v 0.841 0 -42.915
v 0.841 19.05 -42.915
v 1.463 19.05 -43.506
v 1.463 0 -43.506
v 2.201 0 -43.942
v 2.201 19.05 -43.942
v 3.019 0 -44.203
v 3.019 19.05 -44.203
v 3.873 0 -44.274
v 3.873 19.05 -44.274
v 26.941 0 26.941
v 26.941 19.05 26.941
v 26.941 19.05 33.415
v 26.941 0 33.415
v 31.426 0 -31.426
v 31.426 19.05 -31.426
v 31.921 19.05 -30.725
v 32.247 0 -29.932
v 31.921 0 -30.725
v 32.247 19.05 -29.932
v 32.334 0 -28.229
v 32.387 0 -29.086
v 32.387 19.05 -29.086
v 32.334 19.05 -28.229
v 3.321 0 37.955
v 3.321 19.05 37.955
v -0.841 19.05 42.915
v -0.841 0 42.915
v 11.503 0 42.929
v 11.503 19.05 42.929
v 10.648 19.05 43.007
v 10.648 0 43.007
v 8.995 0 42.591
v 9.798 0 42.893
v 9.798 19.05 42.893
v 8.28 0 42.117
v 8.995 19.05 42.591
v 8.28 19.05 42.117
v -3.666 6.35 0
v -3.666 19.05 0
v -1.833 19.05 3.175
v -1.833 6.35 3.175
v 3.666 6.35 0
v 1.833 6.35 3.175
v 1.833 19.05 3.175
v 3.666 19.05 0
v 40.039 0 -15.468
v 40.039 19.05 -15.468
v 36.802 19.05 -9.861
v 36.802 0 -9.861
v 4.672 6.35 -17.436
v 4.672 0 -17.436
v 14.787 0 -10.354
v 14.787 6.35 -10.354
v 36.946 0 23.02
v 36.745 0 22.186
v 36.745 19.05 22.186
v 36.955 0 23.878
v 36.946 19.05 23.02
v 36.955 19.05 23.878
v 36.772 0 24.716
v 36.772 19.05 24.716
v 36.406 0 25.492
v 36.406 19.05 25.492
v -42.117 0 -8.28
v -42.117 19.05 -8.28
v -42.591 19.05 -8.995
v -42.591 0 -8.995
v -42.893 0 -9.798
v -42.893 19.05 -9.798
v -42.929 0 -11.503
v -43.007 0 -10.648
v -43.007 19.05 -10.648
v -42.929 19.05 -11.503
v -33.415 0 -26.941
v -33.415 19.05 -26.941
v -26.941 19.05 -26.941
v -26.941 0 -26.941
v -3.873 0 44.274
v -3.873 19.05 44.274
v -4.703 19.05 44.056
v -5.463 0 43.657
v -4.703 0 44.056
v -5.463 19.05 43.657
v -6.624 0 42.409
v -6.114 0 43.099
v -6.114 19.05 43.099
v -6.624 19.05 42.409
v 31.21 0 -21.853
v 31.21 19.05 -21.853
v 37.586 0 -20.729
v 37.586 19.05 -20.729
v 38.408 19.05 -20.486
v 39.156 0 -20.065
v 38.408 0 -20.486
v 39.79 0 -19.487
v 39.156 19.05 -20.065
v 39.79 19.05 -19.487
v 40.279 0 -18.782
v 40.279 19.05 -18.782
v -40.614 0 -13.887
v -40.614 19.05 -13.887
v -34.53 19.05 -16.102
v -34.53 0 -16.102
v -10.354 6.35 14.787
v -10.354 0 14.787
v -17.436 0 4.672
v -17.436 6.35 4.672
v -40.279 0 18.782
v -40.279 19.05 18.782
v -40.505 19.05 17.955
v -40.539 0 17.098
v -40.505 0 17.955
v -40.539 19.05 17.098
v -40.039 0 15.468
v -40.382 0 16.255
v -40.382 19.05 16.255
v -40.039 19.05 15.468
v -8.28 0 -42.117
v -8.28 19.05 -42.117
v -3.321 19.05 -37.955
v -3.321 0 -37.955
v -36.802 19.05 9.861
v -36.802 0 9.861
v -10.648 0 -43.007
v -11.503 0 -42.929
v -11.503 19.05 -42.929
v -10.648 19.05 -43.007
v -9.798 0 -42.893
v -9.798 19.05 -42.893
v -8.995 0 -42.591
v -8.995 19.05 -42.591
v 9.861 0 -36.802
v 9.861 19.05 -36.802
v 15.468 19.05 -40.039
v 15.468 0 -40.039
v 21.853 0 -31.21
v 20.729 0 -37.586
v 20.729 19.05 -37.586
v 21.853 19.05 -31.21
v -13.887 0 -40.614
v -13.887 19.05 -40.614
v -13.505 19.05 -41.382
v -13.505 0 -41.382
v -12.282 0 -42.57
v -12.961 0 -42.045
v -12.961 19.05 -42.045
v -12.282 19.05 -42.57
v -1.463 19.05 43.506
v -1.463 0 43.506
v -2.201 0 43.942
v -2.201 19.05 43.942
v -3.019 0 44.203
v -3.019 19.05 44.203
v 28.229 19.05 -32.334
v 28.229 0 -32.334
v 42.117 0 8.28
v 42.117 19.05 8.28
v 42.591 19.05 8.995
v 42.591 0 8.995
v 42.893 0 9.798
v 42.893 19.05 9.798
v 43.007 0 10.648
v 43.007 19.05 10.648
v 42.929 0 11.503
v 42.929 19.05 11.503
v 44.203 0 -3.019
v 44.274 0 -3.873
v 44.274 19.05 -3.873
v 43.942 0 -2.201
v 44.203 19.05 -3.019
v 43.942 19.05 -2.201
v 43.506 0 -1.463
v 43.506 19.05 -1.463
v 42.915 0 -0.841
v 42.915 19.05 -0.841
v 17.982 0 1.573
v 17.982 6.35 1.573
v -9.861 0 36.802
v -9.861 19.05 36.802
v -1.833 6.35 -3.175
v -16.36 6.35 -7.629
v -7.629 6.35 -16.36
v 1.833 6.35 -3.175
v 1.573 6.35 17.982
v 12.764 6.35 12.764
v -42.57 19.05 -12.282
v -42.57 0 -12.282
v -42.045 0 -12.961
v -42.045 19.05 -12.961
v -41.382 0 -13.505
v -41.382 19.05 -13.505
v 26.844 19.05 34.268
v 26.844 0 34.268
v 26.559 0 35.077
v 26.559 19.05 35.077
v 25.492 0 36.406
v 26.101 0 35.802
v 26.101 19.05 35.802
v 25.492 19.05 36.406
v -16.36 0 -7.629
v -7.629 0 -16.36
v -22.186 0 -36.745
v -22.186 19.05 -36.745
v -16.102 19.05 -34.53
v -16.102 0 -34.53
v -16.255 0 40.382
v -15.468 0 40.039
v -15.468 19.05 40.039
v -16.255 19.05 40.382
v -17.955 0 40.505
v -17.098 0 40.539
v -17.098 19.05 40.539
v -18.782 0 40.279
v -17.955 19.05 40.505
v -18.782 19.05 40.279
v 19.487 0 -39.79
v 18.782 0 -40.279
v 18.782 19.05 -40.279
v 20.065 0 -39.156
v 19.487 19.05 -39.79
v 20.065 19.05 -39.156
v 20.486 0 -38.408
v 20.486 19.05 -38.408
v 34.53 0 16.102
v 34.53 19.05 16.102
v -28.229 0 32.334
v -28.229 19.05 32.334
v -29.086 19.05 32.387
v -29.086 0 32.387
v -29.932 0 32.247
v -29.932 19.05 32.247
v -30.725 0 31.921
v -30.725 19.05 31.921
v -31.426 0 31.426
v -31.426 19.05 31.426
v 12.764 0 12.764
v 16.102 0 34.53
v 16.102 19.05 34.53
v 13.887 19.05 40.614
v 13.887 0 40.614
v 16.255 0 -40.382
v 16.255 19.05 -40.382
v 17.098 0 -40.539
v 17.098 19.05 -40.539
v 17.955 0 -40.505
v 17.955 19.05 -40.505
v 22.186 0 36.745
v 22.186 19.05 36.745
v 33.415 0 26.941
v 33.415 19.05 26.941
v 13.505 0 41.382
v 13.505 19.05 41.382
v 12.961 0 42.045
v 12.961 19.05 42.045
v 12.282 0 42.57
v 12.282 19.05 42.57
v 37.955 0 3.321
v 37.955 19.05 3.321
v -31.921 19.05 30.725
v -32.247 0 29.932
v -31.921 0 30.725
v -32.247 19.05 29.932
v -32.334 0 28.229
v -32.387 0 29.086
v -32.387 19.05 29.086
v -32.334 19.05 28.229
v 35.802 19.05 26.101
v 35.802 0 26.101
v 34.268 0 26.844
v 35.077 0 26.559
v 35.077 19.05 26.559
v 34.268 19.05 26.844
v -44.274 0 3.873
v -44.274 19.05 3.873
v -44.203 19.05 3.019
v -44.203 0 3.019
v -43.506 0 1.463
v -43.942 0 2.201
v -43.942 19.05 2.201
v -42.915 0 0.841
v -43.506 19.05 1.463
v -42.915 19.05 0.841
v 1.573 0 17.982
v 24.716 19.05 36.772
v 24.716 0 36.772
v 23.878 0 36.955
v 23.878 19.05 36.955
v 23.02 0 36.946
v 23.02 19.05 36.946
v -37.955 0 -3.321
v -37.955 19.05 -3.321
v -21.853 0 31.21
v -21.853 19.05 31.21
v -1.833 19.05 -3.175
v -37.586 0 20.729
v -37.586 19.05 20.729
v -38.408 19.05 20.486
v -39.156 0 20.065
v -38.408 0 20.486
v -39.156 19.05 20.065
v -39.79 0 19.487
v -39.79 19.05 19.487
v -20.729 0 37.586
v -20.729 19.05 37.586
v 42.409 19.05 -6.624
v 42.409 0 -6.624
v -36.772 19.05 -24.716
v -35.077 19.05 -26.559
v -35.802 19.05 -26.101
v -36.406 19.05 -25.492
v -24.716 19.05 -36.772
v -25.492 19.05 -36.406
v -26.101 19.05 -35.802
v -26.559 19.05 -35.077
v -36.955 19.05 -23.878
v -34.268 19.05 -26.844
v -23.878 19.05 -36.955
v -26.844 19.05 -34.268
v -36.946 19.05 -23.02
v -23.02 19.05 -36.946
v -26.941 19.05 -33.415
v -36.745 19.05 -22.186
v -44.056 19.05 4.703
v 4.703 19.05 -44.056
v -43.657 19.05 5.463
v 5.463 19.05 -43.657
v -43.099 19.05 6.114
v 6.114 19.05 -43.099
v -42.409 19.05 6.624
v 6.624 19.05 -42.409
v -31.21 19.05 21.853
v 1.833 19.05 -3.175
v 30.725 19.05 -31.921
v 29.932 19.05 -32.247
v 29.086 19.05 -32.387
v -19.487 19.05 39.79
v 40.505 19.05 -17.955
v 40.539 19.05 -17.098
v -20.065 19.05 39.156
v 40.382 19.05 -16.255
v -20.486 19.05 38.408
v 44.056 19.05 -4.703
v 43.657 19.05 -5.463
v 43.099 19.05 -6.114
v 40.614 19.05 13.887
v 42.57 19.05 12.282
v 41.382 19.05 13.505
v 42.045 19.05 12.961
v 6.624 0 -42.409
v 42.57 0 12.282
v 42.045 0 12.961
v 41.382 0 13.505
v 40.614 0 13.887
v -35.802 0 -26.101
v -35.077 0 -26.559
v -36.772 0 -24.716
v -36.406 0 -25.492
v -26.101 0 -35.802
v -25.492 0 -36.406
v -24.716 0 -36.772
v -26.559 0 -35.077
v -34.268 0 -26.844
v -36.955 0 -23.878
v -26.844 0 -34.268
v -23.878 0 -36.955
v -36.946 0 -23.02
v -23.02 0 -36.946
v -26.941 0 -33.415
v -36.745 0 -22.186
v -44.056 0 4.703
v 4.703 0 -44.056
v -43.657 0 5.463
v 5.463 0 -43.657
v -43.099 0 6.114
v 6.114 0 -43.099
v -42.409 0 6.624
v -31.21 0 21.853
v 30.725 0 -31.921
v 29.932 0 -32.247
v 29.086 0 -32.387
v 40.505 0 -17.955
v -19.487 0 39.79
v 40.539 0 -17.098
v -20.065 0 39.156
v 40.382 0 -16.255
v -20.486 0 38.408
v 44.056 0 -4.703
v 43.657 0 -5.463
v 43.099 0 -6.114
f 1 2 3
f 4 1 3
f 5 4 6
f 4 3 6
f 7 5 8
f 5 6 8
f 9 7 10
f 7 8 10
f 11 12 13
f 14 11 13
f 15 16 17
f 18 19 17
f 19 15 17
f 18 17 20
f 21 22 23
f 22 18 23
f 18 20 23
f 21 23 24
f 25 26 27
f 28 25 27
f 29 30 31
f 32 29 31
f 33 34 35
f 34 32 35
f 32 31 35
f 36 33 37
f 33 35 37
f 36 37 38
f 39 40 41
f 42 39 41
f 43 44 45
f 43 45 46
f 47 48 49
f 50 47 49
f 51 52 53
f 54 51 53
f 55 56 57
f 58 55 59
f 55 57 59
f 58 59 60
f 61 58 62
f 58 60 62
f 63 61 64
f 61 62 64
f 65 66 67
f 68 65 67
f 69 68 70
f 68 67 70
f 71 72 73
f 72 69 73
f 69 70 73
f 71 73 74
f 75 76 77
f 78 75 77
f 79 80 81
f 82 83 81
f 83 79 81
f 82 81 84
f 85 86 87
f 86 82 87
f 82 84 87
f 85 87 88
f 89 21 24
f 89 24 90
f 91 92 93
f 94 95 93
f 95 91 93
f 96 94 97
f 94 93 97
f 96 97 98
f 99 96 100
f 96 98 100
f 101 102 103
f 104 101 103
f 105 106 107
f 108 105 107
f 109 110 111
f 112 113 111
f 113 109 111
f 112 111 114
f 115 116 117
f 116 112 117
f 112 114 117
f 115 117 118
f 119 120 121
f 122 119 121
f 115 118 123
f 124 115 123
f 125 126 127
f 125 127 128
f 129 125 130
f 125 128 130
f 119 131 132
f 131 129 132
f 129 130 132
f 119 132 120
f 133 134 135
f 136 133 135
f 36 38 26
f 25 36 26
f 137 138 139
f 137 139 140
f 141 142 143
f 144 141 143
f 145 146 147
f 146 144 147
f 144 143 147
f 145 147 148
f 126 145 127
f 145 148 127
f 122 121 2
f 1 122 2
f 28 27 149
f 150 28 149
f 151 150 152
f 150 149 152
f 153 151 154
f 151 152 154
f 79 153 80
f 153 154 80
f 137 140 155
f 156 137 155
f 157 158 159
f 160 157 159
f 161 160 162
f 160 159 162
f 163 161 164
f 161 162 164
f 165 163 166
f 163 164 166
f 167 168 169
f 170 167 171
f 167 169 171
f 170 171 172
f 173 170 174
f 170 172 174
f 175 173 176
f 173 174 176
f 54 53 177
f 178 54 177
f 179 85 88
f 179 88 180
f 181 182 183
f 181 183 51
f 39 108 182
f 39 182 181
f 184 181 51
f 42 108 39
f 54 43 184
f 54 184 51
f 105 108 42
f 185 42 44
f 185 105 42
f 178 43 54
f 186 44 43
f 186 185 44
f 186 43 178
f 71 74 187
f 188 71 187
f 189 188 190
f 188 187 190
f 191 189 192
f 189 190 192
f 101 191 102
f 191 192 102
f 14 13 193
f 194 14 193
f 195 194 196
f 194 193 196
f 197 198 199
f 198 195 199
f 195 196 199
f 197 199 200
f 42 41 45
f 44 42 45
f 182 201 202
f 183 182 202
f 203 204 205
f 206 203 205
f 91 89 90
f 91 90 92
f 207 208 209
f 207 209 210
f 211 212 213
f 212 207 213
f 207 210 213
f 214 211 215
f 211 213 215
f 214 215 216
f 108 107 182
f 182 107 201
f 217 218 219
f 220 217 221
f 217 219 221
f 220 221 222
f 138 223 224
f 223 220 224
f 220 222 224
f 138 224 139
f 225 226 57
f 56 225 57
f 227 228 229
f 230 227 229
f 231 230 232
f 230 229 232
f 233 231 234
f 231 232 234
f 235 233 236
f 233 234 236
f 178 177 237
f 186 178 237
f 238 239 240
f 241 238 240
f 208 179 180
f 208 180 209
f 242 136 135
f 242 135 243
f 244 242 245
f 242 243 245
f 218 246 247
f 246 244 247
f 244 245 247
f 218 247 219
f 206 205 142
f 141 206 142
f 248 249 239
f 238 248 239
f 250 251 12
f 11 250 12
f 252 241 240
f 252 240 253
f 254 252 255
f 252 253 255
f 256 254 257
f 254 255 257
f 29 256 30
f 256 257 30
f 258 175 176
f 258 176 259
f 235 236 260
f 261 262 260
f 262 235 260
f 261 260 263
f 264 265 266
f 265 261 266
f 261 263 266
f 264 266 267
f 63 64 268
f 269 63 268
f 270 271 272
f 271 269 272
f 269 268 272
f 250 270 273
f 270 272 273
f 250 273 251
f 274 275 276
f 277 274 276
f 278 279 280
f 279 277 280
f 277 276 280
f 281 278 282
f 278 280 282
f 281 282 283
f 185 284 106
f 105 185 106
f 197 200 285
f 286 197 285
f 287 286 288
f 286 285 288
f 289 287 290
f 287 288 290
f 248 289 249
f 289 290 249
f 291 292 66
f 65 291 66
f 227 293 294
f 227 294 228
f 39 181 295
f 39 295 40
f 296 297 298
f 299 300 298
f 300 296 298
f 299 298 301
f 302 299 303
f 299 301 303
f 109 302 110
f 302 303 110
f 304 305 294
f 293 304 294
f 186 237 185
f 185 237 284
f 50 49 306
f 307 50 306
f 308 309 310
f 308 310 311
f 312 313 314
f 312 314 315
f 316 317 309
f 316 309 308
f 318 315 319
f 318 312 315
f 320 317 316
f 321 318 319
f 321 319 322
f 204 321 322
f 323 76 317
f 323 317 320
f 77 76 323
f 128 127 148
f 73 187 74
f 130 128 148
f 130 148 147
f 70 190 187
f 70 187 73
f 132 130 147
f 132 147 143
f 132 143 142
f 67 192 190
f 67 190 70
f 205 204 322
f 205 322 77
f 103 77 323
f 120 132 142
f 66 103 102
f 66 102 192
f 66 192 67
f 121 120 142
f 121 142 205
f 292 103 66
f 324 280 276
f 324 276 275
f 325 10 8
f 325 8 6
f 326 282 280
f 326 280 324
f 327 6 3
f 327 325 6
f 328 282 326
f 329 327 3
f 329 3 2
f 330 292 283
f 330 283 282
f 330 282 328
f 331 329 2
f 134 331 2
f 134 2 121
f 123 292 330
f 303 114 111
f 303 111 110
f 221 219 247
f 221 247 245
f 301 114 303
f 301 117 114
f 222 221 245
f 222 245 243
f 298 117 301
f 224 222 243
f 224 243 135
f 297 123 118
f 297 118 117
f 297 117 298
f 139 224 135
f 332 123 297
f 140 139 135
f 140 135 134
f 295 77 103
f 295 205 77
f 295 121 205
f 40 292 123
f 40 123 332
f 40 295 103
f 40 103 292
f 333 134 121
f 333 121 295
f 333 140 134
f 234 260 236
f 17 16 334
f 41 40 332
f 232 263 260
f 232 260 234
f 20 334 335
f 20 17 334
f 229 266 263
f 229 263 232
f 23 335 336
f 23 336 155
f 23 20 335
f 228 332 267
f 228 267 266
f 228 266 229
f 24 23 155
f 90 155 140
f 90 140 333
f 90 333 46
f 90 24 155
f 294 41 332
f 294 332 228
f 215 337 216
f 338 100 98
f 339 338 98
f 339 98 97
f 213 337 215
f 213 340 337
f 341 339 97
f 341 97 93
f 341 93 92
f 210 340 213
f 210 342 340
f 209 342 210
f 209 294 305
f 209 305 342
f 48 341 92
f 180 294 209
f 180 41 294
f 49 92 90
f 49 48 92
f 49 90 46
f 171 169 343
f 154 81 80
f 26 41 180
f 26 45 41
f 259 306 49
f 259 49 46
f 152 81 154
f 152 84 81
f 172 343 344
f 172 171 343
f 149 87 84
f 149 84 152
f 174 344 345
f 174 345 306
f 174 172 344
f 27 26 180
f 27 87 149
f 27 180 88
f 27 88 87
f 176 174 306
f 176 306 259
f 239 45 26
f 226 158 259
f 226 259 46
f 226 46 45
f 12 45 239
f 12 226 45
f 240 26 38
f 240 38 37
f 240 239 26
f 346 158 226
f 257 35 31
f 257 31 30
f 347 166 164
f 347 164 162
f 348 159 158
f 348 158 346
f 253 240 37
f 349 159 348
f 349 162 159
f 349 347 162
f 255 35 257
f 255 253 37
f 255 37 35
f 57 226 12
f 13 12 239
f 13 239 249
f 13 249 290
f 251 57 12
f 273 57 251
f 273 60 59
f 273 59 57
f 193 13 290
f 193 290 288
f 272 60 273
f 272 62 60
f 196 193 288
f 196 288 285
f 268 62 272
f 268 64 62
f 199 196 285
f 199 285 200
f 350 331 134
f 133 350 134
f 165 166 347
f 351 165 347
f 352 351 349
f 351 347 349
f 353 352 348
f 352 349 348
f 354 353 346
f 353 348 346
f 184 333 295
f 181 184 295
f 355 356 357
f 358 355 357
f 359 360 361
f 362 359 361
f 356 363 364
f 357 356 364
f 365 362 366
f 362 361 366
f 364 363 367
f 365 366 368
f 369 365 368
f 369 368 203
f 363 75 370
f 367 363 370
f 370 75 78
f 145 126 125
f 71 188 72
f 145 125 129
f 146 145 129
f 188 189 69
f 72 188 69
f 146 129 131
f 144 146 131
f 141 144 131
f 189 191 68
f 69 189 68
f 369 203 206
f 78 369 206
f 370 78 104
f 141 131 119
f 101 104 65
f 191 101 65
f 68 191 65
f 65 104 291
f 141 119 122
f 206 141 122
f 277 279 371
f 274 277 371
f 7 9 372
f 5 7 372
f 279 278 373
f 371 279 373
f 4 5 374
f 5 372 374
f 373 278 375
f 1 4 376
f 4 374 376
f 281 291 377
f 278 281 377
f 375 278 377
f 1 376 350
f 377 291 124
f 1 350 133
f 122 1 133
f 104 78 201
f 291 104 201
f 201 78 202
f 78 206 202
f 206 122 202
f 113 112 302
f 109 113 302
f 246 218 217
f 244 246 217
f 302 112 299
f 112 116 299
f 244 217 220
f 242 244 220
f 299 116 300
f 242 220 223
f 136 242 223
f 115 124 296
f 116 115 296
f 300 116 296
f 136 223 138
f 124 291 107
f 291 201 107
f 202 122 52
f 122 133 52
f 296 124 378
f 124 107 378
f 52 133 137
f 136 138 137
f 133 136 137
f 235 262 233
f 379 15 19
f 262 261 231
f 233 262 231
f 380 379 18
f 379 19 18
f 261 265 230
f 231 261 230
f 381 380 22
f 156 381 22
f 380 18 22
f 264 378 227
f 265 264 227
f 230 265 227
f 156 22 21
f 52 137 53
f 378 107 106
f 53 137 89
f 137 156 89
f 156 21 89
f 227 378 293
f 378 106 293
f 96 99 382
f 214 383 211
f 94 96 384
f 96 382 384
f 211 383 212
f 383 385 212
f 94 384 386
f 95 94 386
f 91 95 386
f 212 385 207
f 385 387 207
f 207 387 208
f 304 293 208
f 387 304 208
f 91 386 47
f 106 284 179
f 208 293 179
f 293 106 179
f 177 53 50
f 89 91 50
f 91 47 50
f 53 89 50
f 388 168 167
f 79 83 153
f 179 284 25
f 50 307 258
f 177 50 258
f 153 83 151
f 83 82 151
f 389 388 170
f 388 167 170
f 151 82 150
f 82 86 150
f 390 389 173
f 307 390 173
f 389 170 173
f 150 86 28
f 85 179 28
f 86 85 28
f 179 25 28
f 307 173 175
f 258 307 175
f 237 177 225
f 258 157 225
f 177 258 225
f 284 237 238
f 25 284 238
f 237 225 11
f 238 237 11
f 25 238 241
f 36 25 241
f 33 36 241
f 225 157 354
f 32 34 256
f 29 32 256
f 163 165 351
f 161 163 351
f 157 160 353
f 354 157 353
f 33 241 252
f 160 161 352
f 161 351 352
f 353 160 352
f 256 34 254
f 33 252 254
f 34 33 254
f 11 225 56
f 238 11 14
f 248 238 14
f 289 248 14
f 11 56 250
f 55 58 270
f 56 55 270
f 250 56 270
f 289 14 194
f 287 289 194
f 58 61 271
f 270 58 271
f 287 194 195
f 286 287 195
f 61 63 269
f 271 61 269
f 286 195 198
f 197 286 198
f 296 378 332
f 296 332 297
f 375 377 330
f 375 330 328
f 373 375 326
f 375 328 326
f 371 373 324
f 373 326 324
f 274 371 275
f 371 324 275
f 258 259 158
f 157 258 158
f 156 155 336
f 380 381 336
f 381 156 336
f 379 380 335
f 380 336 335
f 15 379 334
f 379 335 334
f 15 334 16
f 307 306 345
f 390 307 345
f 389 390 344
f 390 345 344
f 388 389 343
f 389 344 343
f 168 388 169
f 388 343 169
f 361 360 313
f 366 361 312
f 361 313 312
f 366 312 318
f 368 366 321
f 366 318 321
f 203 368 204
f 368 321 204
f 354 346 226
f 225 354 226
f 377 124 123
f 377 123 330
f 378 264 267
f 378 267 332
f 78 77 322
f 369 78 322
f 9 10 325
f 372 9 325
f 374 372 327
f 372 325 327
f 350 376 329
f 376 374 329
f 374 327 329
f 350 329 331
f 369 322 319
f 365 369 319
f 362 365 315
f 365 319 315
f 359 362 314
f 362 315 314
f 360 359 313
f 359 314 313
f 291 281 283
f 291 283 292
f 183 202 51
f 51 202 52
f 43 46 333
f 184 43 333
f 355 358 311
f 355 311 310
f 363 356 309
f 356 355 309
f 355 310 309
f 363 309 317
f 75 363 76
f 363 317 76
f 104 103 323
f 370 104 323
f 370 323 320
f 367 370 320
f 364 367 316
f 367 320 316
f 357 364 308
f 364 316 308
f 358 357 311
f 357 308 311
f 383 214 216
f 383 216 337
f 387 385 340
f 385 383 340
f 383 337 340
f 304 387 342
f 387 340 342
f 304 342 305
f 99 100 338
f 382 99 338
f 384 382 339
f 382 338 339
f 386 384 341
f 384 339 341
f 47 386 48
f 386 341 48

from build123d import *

# Parameters (mm, degrees)
SKETCH1_R           = 44.45
BOSS_EXTRUDE1_DEPTH = 19.05
SKETCH2_W           = 8.414535341
SKETCH2_H           = 8.414535341
CUT_EXTRUDE1_DEPTH  = 29.972
CIRPATTERN1_COUNT   = 18
CUT_EXTRUDE2_DEPTH  = 6.35
FILLET3_R           = 3.81
CUT_EXTRUDE6_DEPTH  = 25.908


with BuildPart() as part:
    # Sketch1 → Boss-Extrude1 (new body)
    with BuildSketch(Plane(origin=(0, 0, 0), x_dir=(1, 0, 0), z_dir=(0, 1, 0))):
        with Locations(Location((0, 0, 0), (0, 0, 270))):
            Circle(SKETCH1_R)
    extrude(amount=BOSS_EXTRUDE1_DEPTH)

    # Sketch2 → Cut-Extrude1 (cut)
    with BuildSketch(Plane(origin=(0, 19.05, 0), x_dir=(1, 0, 0), z_dir=(0, 1, 0))):
        with Locations((-31.148036033, 31.148036033)):
            Rectangle(SKETCH2_W, SKETCH2_H)
    cut_extrude1 = extrude(amount=-CUT_EXTRUDE1_DEPTH, mode=Mode.SUBTRACT)

    # CirPattern1: Cut-Extrude1 ×18 about axis
    cirpattern1_axis = Axis((0, 0, 0), (0, 1, 0))
    for i in range(1, CIRPATTERN1_COUNT):
        add(cut_extrude1.rotate(cirpattern1_axis, i * 360 / CIRPATTERN1_COUNT), mode=Mode.SUBTRACT)

    # Sketch4 → Cut-Extrude2 (cut)
    with BuildSketch(Plane.XZ):
        Polygon((4.671980957, -17.436070304), (14.786635004, -10.353713294), (17.982458197, 1.573261235), (12.764089347, 12.764089347), (1.573261235, 17.982458197), (-10.353713294, 14.786635004), (-17.436070304, 4.671980957), (-16.359896238, -7.628744902), (-7.628744902, -16.359896238), align=None)
    extrude(amount=-CUT_EXTRUDE2_DEPTH, mode=Mode.SUBTRACT)

    # Fillet3
    # the kernel refuses this fillet: 3.81 mm, written as the material it takes off along each edge
    with BuildSketch(Plane(origin=(-9.766541838, 24.122461368, -43.363777056), x_dir=(-0.9702942077465824, 0, 0.24192798600705953), z_dir=(0, -1, 0)), Plane(origin=(-24.008832539, 24.122461368, -37.408267269), x_dir=(-0.8290340625621466, 0, 0.5591981072139847), z_dir=(0, -1, 0)), Plane(origin=(-35.355303704, 24.122461368, -26.940768363), x_dir=(-0.5877801741930432, 0, 0.8090206838057948), z_dir=(0, -1, 0)), Plane(origin=(35.355303704, 24.122461368, 26.940768363), x_dir=(0.5877801741930427, 0, -0.8090206838057951), z_dir=(0, -1, 0)), Plane(origin=(42.437403453, 24.122461368, 13.223815189), x_dir=(0.2756313221047677, 0, -0.9612634260569668), z_dir=(0, -1, 0)), Plane(origin=(44.400926037, 24.122461368, -2.08812526), x_dir=(-0.06976273531441618, 0, -0.9975636123884285), z_dir=(0, -1, 0)), Plane(origin=(41.009041652, 24.122461368, -17.148206985), x_dir=(-0.40674237726635254, 0, -0.913542904594916), z_dir=(0, -1, 0)), Plane(origin=(32.670861615, 24.122461368, -30.139961867), x_dir=(-0.6946628856418128, 0, -0.7193354400499046), z_dir=(0, -1, 0)), Plane(origin=(20.392093497, 24.122461368, -39.496392529), x_dir=(-0.8987967978765562, 0, -0.43836550517444806), z_dir=(0, -1, 0)), Plane(origin=(5.653737948, 24.122461368, -44.088975348), x_dir=(-0.9945225514593977, 0, -0.10452222078911967), z_dir=(0, -1, 0))) as fillet3_piece_1:
        with BuildLine():
            CenterArc((1.942028067, -3.809007557), FILLET3_R, 88.692212078, 55.30814756)
            Line((-1.140340739, -1.569565093), (0, 0))
            ThreePointArc((0, 0), (1.014492274, 0.0115785), (2.028984547, 0))
        make_face()
    extrude(amount=29.194922737, mode=Mode.SUBTRACT)
    with BuildSketch(Plane(origin=(-13.223815189, 24.122461368, -42.437403453), x_dir=(-0.34202014332566844, 0, 0.9396926207859085), z_dir=(0, -1, 0)), Plane(origin=(-26.940768363, 24.122461368, -35.355303704), x_dir=(0, 0, 1), z_dir=(0, -1, 0)), Plane(origin=(37.408267269, 24.122461368, 24.008832539), x_dir=(-0.3420201433256682, 0, -0.9396926207859086), z_dir=(0, -1, 0)), Plane(origin=(43.363777056, 24.122461368, 9.766541838), x_dir=(-0.6427876096865393, 0, -0.7660444431189782), z_dir=(0, -1, 0)), Plane(origin=(44.088975348, 24.122461368, -5.653737948), x_dir=(-0.8660254037844388, 0, -0.4999999999999997), z_dir=(0, -1, 0)), Plane(origin=(39.496392529, 24.122461368, -20.392093497), x_dir=(-0.984807753012208, 0, -0.1736481776669302), z_dir=(0, -1, 0)), Plane(origin=(30.139961867, 24.122461368, -32.670861615), x_dir=(-0.9848077530122079, 0, 0.17364817766693105), z_dir=(0, -1, 0)), Plane(origin=(17.148206985, 24.122461368, -41.009041652), x_dir=(-0.8660254037844395, 0, 0.49999999999999856), z_dir=(0, -1, 0)), Plane(origin=(2.08812526, 24.122461368, -44.400926037), x_dir=(-0.6427876096865408, 0, 0.7660444431189768), z_dir=(0, -1, 0))) as fillet3_piece_2:
        with BuildLine():
            CenterArc((1.940080303, -3.81), FILLET3_R, 90, 55.30814756)
            ThreePointArc((-1.192596891, -1.641490466), (-0.605665691, -0.81393962), (0, 0))
            Line((0, 0), (1.940080303, 0))
        make_face()
    extrude(amount=29.194922737, mode=Mode.SUBTRACT)
    with BuildSketch(Plane(origin=(-37.408267269, 24.122461368, -24.008832539), x_dir=(0.559198107213983, 0, -0.8290340625621475), z_dir=(0, -1, 0)), Plane(origin=(-43.363777056, 24.122461368, -9.766541838), x_dir=(0.24192798600706303, 0, -0.9702942077465815), z_dir=(0, -1, 0)), Plane(origin=(-44.088975348, 24.122461368, 5.653737948), x_dir=(-0.1045222207891241, 0, -0.9945225514593973), z_dir=(0, -1, 0)), Plane(origin=(-39.496392529, 24.122461368, 20.392093497), x_dir=(-0.43836550517444245, 0, -0.8987967978765589), z_dir=(0, -1, 0)), Plane(origin=(-30.139961867, 24.122461368, 32.670861615), x_dir=(-0.7193354400499047, 0, -0.6946628856418126), z_dir=(0, -1, 0)), Plane(origin=(-17.148206985, 24.122461368, 41.009041652), x_dir=(-0.9135429045949142, 0, -0.4067423772663572), z_dir=(0, -1, 0)), Plane(origin=(-2.08812526, 24.122461368, 44.400926037), x_dir=(-0.9975636123884287, 0, -0.06976273531441333), z_dir=(0, -1, 0)), Plane(origin=(13.223815189, 24.122461368, 42.437403453), x_dir=(-0.9612634260569665, 0, 0.2756313221047693), z_dir=(0, -1, 0)), Plane(origin=(26.940768363, 24.122461368, 35.355303704), x_dir=(-0.809020683805795, 0, 0.587780174193043), z_dir=(0, -1, 0))) as fillet3_piece_3:
        with BuildLine():
            CenterArc((1.942028067, 3.809007557), FILLET3_R, 215.999640362, 55.30814756)
            Line((-1.140340739, 1.569565093), (0, 0))
            ThreePointArc((0, 0), (1.014492274, -0.0115785), (2.028984547, 0))
        make_face()
    extrude(amount=29.194922737, mode=Mode.SUBTRACT)
    with BuildSketch(Plane(origin=(-42.437403453, 24.122461368, -13.223815189), x_dir=(0.9396926207859084, 0, -0.3420201433256688), z_dir=(0, -1, 0)), Plane(origin=(-44.400926037, 24.122461368, 2.08812526), x_dir=(0.7660444431189783, 0, -0.6427876096865389), z_dir=(0, -1, 0)), Plane(origin=(-41.009041652, 24.122461368, 17.148206985), x_dir=(0.4999999999999989, 0, -0.8660254037844393), z_dir=(0, -1, 0)), Plane(origin=(-32.670861615, 24.122461368, 30.139961867), x_dir=(0.173648177666932, 0, -0.9848077530122078), z_dir=(0, -1, 0)), Plane(origin=(-20.392093497, 24.122461368, 39.496392529), x_dir=(-0.17364817766693083, 0, -0.9848077530122079), z_dir=(0, -1, 0)), Plane(origin=(-5.653737948, 24.122461368, 44.088975348), x_dir=(-0.49999999999999867, 0, -0.8660254037844395), z_dir=(0, -1, 0)), Plane(origin=(9.766541838, 24.122461368, 43.363777056), x_dir=(-0.7660444431189792, 0, -0.6427876096865378), z_dir=(0, -1, 0)), Plane(origin=(24.008832539, 24.122461368, 37.408267269), x_dir=(-0.9396926207859089, 0, -0.34202014332566766), z_dir=(0, -1, 0))) as fillet3_piece_4:
        with BuildLine():
            CenterArc((1.940080303, 3.81), FILLET3_R, 214.69185244, 55.30814756)
            ThreePointArc((-1.192596891, 1.641490466), (-0.605665691, 0.81393962), (0, 0))
            Line((0, 0), (1.940080303, 0))
        make_face()
    extrude(amount=29.194922737, mode=Mode.SUBTRACT)

    # Sketch6 → Cut-Extrude6 (cut)
    with BuildSketch(Plane(origin=(0, 19.05, 0), x_dir=(1, 0, 0), z_dir=(0, 1, 0))):
        Polygon((3.666174209, 0), (1.833087105, 3.175), (-1.833087105, 3.175), (-3.666174209, 0), (-1.833087105, -3.175), (1.833087105, -3.175), align=None)
    extrude(amount=-CUT_EXTRUDE6_DEPTH, mode=Mode.SUBTRACT)


solid = part.part
